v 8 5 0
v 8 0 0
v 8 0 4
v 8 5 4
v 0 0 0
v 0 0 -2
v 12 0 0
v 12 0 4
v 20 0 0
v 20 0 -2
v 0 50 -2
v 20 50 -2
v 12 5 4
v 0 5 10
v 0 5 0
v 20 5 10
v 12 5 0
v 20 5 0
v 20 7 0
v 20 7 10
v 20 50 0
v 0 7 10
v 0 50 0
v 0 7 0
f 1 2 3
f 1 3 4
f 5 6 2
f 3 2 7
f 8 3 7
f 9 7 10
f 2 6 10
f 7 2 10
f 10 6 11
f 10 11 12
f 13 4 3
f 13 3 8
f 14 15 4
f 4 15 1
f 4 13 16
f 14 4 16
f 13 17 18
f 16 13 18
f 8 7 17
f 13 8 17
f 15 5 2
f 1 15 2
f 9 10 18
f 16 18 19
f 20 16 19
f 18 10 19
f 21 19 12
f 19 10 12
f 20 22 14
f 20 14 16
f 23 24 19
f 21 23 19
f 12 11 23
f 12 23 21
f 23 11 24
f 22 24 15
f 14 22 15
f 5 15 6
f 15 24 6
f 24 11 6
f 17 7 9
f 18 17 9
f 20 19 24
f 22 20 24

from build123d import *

# Parameters (mm, degrees)
CROQUIS1_W              = 20
CROQUIS1_H              = 2
SALIENTE_EXTRUIR1_DEPTH = 50
CROQUIS2_W              = 4
CROQUIS2_H              = 5
SALIENTE_EXTRUIR2_DEPTH = 4
SALIENTE_EXTRUIR3_DEPTH = 10


with BuildPart() as part:
    # Croquis1 → Saliente-Extruir1 (new body)
    with BuildSketch(Plane(origin=(0, 0, 0), x_dir=(1, 0, 0), z_dir=(0, 1, 0))):
        with Locations((10, 1)):
            Rectangle(CROQUIS1_W, CROQUIS1_H)
    extrude(amount=SALIENTE_EXTRUIR1_DEPTH)

    # Croquis2 → Saliente-Extruir2 (add)
    with BuildSketch(Plane.XY):
        with Locations((10, 2.5)):
            Rectangle(CROQUIS2_W, CROQUIS2_H)
    extrude(amount=SALIENTE_EXTRUIR2_DEPTH)

    # Croquis3 → Saliente-Extruir3 (add)
    with BuildSketch(Plane.XY):
        Polygon((12, 5), (20, 5), (20, 7), (0, 7), (0, 5), align=None)
    extrude(amount=SALIENTE_EXTRUIR3_DEPTH)


solid = part.part
